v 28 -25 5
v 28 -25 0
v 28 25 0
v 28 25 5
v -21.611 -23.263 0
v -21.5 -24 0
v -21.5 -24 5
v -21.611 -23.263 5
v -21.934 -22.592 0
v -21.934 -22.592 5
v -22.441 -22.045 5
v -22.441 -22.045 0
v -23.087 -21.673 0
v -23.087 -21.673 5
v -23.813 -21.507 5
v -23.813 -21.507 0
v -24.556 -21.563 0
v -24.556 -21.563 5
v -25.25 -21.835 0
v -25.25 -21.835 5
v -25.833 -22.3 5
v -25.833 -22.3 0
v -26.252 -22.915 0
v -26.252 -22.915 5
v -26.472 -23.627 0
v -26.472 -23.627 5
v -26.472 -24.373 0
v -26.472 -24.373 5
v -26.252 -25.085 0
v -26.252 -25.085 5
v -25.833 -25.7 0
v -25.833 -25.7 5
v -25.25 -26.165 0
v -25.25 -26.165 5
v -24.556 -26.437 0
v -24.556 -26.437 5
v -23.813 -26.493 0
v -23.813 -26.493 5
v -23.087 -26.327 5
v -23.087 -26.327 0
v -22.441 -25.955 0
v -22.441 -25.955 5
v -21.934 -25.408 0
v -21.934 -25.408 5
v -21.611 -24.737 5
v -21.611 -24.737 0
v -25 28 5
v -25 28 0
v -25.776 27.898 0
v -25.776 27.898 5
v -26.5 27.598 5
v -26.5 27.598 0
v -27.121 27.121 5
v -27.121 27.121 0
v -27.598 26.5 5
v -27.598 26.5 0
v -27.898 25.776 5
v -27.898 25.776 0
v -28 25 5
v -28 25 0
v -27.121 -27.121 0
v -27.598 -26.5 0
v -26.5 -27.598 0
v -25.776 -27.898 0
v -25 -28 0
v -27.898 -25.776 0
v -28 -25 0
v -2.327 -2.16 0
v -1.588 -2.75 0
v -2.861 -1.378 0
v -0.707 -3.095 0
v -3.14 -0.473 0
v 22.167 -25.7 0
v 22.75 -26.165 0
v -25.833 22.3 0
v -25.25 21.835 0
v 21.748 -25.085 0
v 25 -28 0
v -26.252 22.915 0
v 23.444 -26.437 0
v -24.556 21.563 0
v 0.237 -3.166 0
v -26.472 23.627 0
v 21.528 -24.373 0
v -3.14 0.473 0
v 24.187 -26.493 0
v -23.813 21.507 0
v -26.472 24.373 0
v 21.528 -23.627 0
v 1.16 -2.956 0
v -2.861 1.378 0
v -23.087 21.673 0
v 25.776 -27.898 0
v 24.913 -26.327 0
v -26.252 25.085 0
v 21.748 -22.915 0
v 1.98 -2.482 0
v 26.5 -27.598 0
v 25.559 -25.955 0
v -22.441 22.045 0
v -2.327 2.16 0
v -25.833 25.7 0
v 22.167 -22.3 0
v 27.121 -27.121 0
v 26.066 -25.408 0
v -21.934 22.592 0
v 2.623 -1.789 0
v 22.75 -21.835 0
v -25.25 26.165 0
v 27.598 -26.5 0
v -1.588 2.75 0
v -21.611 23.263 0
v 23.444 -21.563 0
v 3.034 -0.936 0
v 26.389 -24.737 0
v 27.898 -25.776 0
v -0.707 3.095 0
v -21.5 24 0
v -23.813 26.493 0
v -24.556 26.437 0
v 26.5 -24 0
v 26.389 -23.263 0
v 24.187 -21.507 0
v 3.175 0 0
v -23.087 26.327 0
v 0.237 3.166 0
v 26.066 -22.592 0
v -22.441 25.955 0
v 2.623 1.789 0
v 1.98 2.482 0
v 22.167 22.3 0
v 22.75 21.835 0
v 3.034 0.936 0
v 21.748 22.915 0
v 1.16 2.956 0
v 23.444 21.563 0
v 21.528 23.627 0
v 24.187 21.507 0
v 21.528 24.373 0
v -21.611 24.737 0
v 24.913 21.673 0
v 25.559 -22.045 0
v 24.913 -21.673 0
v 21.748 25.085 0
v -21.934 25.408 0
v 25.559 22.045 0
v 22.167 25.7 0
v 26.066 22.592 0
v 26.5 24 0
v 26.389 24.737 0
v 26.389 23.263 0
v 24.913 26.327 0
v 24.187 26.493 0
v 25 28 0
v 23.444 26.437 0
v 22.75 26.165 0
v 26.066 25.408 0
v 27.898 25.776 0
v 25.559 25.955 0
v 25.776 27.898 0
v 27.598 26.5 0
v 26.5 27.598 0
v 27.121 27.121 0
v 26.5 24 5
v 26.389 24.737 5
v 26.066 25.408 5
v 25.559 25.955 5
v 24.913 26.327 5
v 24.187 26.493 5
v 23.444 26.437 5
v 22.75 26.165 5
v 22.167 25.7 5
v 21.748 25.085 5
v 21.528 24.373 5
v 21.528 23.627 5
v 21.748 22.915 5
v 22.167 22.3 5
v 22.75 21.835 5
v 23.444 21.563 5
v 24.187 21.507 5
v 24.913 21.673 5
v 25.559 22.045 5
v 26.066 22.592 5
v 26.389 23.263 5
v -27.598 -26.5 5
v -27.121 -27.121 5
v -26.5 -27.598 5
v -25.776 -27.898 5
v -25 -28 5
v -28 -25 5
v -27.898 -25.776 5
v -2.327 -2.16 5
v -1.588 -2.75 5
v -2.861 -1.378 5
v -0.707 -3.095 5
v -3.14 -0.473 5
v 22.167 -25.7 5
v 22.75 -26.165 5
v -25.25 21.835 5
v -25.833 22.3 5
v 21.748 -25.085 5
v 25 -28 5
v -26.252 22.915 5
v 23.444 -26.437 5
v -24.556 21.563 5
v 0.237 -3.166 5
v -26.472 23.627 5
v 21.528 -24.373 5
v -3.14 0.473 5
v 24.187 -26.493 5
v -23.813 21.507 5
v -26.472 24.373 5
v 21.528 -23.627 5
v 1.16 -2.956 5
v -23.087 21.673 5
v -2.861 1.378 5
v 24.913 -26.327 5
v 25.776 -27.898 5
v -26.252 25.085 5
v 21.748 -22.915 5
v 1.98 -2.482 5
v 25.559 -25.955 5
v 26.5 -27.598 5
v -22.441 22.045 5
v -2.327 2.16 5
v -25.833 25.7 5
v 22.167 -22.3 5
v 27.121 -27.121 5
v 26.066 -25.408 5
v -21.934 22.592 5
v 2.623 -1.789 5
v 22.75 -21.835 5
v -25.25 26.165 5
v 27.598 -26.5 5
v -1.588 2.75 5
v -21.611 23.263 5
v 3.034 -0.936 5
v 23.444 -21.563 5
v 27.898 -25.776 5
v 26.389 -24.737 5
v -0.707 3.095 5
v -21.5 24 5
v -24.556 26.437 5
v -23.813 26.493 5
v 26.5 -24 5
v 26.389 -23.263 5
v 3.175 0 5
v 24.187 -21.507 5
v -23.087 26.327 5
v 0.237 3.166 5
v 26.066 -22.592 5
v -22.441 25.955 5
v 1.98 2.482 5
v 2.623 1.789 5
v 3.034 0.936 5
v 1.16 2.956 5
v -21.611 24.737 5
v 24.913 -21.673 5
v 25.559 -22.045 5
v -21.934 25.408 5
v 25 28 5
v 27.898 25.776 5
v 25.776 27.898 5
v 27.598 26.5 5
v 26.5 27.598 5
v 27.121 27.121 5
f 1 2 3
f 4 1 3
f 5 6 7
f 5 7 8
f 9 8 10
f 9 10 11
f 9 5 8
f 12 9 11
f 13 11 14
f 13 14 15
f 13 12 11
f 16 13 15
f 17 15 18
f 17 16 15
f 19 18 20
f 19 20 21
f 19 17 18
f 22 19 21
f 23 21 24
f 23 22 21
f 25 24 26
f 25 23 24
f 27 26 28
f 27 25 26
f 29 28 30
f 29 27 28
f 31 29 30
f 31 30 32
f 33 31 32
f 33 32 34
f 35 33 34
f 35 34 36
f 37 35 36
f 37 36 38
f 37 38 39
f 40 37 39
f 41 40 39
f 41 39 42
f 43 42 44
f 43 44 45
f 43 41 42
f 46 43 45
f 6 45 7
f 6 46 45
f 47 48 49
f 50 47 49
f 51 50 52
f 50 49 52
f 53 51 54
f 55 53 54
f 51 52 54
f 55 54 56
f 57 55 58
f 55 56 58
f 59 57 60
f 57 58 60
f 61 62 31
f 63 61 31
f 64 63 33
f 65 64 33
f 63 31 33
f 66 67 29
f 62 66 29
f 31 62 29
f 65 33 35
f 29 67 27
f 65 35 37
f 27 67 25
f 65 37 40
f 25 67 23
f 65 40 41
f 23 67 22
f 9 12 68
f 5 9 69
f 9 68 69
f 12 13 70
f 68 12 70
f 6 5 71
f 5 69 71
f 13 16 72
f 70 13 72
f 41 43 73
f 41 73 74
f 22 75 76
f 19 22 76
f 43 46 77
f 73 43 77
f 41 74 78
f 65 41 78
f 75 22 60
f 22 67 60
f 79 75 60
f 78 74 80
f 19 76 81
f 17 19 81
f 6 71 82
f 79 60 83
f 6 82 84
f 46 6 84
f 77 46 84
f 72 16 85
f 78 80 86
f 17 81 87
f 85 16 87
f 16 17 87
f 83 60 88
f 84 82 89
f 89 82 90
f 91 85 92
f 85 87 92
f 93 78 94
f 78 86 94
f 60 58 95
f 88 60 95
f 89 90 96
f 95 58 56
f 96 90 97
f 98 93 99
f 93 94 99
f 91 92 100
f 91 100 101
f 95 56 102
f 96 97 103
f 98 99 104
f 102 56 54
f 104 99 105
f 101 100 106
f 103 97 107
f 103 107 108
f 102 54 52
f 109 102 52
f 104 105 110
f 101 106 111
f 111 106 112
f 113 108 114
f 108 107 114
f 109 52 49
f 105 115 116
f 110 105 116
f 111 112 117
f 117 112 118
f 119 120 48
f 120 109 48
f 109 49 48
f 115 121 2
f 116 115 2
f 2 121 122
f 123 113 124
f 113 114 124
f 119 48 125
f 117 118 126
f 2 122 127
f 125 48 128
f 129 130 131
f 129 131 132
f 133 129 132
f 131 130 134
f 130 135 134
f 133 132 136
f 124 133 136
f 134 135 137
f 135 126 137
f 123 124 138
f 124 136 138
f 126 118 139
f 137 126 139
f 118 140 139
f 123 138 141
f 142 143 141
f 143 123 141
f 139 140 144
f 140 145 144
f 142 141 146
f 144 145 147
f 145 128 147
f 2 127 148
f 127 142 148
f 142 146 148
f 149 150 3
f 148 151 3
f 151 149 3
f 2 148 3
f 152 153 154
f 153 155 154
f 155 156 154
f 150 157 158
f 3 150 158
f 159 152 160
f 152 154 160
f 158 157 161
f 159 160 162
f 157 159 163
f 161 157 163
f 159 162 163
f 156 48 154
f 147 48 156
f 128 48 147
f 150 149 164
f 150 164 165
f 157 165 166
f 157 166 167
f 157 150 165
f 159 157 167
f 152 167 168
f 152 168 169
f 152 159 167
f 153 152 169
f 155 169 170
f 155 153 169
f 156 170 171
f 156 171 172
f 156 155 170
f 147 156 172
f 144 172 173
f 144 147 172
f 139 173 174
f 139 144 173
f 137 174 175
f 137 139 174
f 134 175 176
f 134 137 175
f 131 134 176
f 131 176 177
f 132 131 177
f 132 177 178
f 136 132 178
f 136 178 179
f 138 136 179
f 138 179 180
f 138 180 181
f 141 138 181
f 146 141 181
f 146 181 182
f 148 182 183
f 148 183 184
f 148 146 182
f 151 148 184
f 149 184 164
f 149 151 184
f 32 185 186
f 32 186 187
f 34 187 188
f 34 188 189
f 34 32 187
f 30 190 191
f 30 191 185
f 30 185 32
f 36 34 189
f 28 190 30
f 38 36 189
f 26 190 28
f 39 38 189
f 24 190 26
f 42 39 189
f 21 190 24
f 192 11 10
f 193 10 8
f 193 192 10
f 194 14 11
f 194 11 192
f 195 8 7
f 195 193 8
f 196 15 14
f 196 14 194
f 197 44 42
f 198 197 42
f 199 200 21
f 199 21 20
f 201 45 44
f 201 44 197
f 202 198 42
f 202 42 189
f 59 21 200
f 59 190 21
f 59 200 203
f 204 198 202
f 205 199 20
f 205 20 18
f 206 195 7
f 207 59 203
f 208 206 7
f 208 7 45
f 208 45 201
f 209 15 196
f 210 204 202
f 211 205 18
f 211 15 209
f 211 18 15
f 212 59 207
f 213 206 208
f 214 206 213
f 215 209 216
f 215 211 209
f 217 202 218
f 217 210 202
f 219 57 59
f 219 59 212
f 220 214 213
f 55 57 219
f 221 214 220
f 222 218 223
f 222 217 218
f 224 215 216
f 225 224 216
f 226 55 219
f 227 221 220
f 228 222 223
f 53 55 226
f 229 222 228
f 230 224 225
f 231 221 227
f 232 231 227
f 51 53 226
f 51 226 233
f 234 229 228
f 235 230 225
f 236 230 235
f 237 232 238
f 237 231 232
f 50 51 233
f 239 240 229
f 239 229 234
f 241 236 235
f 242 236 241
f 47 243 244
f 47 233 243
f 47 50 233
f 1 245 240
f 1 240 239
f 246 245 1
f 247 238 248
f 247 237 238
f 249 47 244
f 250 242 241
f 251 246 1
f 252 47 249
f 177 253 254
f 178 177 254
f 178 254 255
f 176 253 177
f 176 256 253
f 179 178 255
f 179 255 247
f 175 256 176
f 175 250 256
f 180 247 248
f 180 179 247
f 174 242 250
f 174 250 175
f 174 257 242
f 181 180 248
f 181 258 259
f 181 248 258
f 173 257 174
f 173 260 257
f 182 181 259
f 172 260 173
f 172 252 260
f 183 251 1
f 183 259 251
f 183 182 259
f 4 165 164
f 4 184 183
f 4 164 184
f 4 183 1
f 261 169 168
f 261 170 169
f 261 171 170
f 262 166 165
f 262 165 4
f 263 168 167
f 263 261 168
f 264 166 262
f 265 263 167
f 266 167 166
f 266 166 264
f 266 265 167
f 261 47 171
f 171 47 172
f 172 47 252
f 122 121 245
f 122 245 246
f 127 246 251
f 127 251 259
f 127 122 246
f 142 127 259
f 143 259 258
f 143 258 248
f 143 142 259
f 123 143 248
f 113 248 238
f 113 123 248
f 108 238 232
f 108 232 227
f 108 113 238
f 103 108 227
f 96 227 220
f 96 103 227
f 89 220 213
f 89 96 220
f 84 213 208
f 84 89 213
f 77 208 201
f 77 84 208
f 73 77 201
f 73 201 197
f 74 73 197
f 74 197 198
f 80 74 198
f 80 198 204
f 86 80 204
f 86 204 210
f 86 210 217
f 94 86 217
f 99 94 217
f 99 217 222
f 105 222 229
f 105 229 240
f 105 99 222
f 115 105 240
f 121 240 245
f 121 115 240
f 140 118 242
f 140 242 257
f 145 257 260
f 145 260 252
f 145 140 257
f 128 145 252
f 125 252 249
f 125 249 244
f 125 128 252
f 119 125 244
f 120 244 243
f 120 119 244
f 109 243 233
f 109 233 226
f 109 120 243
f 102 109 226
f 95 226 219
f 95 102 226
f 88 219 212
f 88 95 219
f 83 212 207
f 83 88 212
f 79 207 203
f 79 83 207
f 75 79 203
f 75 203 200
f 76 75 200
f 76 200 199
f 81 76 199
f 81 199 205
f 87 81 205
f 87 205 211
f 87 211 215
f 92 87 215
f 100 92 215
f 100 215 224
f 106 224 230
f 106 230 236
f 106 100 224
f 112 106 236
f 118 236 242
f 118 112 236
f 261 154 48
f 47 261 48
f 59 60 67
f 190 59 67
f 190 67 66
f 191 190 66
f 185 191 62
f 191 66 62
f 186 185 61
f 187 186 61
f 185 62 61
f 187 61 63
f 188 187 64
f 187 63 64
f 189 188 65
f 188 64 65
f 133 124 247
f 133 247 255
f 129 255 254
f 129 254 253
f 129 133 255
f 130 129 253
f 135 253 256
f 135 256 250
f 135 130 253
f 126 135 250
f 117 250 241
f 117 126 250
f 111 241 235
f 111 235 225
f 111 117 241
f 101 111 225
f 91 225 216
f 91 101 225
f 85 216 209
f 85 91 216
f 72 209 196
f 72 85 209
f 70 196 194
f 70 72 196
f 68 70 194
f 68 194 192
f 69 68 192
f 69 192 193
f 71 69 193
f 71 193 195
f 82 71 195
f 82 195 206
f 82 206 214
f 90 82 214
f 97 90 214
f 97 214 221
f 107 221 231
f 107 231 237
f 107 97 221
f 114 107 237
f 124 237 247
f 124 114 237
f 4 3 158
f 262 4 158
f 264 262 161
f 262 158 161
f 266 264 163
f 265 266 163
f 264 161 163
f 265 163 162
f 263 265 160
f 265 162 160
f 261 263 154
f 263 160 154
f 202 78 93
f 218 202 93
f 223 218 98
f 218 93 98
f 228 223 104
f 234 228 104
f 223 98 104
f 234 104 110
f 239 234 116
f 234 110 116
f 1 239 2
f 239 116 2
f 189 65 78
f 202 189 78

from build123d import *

# Parameters (mm, degrees)
SKETCH1_R           = 2.5
SKETCH1_R_2         = 3.175
BOSS_EXTRUDE1_DEPTH = 5


with BuildPart() as part:
    # Sketch1 → Boss-Extrude1 (new body)
    with BuildSketch(Plane.XY):
        with BuildLine():
            Line((-28, 25), (-28, -25))
            ThreePointArc((-28, -25), (-27.121320344, -27.121320344), (-25, -28))
            Line((-25, -28), (25, -28))
            ThreePointArc((25, -28), (27.121320344, -27.121320344), (28, -25))
            Line((28, -25), (28, 25))
            ThreePointArc((28, 25), (27.121320344, 27.121320344), (25, 28))
            Line((25, 28), (-25, 28))
            ThreePointArc((-25, 28), (-27.121320344, 27.121320344), (-28, 25))
        make_face()
        with Locations((-24, -24)):
            Circle(SKETCH1_R, mode=Mode.SUBTRACT)
        with Locations((24, -24)):
            Circle(SKETCH1_R, mode=Mode.SUBTRACT)
        with Locations((-24, 24)):
            Circle(SKETCH1_R, mode=Mode.SUBTRACT)
        Circle(SKETCH1_R_2, mode=Mode.SUBTRACT)
        with Locations((24, 24)):
            Circle(SKETCH1_R, mode=Mode.SUBTRACT)
    extrude(amount=BOSS_EXTRUDE1_DEPTH)


solid = part.part
